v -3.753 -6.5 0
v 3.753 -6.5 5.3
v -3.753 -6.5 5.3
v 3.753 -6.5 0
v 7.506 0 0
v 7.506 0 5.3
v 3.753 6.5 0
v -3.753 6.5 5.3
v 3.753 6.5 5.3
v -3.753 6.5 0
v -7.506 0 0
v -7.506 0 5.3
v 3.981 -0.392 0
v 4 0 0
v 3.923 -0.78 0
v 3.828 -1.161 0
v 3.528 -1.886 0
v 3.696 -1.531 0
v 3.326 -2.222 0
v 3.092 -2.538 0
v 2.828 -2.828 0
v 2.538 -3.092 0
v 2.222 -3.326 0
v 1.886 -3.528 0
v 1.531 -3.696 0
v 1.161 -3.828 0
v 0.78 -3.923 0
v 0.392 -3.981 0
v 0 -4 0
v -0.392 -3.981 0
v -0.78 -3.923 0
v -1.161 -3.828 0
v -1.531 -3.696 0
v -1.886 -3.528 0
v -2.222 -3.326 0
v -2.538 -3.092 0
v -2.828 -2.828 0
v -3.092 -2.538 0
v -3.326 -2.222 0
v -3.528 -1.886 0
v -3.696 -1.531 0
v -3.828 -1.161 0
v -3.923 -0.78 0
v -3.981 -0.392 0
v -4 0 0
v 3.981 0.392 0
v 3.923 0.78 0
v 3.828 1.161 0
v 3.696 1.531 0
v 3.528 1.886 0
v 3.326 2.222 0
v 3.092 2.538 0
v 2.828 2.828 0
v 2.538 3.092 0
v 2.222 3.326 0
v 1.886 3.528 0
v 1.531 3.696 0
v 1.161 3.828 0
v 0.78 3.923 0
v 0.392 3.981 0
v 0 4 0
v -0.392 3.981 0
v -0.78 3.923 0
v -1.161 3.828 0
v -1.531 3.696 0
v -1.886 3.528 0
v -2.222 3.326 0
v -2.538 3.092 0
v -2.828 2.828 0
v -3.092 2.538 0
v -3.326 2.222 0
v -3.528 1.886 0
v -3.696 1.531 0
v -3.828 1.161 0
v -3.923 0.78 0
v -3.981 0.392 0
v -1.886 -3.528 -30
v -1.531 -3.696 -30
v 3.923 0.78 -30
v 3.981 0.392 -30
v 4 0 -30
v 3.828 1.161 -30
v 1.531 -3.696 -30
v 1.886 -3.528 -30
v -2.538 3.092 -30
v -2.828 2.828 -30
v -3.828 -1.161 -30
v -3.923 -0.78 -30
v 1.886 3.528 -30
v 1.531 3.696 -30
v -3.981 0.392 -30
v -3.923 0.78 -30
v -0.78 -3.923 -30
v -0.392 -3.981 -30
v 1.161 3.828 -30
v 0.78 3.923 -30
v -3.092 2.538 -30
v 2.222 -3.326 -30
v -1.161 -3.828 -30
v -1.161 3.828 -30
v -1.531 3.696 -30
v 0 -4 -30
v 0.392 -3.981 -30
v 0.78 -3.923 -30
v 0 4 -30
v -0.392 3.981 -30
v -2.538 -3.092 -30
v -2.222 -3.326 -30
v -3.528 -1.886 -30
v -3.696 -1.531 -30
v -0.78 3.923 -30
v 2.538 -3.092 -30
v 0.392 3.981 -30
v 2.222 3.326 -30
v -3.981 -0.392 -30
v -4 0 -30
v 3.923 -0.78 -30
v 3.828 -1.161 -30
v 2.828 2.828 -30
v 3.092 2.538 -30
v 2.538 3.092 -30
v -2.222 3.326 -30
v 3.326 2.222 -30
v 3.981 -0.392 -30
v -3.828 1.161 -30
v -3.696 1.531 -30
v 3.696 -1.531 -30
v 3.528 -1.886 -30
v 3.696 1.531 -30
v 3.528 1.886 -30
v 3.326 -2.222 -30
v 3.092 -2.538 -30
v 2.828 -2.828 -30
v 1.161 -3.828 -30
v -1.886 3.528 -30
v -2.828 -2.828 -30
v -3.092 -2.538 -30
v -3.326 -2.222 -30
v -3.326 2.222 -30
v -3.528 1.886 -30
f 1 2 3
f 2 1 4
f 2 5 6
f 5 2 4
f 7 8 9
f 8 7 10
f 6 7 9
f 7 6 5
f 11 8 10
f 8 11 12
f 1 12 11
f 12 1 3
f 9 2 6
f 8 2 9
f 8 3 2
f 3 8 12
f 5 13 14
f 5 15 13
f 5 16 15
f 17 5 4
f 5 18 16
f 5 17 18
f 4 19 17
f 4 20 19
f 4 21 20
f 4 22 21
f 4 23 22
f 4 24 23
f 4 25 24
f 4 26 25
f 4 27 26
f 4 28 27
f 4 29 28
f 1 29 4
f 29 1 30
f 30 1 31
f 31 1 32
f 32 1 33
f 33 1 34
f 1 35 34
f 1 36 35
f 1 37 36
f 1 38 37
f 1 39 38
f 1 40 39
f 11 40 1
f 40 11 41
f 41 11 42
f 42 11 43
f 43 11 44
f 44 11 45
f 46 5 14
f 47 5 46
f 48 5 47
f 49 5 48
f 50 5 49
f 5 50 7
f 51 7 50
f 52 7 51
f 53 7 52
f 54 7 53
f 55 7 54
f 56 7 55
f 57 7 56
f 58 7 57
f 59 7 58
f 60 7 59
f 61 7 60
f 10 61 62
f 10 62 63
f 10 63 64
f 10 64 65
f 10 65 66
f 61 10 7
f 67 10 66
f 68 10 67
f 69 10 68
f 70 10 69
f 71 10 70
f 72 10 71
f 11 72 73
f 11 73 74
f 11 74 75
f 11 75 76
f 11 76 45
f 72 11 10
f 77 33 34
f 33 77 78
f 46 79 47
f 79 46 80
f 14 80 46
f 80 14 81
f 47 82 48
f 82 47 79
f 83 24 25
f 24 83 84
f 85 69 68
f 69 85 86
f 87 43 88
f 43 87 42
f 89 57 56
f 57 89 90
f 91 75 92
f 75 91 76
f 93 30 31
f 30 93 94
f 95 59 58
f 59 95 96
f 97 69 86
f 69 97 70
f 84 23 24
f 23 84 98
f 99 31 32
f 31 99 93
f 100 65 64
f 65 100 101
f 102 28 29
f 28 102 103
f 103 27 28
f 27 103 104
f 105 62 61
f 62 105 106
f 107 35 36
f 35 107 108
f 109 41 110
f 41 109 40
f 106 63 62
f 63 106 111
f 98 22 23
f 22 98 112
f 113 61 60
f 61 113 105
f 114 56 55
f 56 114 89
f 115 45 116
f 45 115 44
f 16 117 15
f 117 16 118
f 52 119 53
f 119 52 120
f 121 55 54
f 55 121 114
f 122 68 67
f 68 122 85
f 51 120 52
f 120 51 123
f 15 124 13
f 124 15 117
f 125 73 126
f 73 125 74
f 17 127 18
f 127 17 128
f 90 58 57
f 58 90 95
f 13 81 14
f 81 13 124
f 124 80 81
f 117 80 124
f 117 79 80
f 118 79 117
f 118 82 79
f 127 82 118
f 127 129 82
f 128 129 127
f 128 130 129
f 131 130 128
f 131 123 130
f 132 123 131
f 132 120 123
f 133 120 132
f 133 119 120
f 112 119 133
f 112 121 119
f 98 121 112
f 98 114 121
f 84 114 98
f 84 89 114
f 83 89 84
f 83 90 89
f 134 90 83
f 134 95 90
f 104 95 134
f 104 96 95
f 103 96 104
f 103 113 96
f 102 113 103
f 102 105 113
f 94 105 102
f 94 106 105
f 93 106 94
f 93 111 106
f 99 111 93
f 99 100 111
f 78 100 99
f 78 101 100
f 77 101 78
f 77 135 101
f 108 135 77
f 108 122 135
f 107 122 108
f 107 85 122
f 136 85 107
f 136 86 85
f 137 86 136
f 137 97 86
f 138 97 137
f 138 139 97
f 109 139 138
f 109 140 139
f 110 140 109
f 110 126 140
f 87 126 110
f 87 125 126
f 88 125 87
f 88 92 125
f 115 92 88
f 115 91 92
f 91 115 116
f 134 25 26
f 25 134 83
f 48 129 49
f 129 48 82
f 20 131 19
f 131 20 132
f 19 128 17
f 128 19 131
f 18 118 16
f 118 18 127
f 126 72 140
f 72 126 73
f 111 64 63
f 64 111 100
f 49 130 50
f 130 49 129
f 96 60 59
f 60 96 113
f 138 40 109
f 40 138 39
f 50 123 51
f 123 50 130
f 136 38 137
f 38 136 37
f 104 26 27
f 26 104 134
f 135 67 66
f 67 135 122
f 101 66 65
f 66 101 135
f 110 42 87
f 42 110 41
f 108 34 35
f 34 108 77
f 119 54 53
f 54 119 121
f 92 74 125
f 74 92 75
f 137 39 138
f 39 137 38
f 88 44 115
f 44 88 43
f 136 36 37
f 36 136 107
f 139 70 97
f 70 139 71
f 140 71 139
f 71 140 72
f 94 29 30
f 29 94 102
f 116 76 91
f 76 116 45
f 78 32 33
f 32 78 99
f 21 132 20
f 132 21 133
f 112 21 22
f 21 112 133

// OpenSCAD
$fn = 64;

across_flats   = 13;
head_height    = 5.3;
shank_diameter = 8;
shank_length   = 30;

union() {
    // 六角頭部：対辺距離 13 mm、底面 z=0
    cylinder(
        h = head_height,
        r = across_flats / sqrt(3),
        $fn = 6
    );

    // シャンク：z=-30 から z=0
    translate([0, 0, -shank_length])
        cylinder(
            h = shank_length,
            d = shank_diameter
        );
}
